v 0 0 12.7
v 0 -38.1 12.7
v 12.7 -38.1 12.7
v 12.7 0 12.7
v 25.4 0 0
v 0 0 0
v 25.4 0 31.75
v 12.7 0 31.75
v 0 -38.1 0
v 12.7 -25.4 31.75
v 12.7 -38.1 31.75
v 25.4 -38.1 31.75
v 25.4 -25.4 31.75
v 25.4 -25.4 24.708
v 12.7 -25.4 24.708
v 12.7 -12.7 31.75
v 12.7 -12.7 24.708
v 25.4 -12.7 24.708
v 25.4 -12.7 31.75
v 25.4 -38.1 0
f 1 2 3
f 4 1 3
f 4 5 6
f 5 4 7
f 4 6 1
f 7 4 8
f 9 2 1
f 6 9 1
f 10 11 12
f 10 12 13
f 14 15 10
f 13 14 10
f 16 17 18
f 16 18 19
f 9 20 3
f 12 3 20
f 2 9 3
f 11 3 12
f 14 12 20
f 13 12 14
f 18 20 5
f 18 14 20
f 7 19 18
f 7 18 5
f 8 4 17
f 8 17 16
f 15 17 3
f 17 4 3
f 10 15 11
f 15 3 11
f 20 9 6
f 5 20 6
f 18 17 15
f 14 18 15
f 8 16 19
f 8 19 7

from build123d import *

# Parameters (mm, degrees)
F0_W     = 38.1
F0_H     = 31.75
F1_DEPTH = 25.4
F2_W     = 12.7
F2_H     = 19.05
F3_DEPTH = 38.1
F4_W     = 12.7
F4_H     = 7.042224
F5_DEPTH = 25.4


with BuildPart() as f1:
    # F0 (on Right) → F1 (new body)
    with BuildSketch(Plane.YZ):
        with Locations((-19.05, 15.875)):
            Rectangle(F0_W, F0_H)
    extrude(amount=F1_DEPTH)

    # F2 (on face) → F3 (cut)
    with BuildSketch(Plane.XZ.offset(38.1)):
        with Locations((6.35, 22.225)):
            Rectangle(F2_W, F2_H)
    extrude(amount=-F3_DEPTH, mode=Mode.SUBTRACT)

    # F4 (on face) → F5 (cut)
    with BuildSketch(Plane(origin=(12.7, 0, 0), x_dir=(0, -1, 0), z_dir=(-1, 0, 0))):
        with Locations((19.05, 28.228888)):
            Rectangle(F4_W, F4_H)
    extrude(amount=-F5_DEPTH, mode=Mode.SUBTRACT)


solid = f1.part
